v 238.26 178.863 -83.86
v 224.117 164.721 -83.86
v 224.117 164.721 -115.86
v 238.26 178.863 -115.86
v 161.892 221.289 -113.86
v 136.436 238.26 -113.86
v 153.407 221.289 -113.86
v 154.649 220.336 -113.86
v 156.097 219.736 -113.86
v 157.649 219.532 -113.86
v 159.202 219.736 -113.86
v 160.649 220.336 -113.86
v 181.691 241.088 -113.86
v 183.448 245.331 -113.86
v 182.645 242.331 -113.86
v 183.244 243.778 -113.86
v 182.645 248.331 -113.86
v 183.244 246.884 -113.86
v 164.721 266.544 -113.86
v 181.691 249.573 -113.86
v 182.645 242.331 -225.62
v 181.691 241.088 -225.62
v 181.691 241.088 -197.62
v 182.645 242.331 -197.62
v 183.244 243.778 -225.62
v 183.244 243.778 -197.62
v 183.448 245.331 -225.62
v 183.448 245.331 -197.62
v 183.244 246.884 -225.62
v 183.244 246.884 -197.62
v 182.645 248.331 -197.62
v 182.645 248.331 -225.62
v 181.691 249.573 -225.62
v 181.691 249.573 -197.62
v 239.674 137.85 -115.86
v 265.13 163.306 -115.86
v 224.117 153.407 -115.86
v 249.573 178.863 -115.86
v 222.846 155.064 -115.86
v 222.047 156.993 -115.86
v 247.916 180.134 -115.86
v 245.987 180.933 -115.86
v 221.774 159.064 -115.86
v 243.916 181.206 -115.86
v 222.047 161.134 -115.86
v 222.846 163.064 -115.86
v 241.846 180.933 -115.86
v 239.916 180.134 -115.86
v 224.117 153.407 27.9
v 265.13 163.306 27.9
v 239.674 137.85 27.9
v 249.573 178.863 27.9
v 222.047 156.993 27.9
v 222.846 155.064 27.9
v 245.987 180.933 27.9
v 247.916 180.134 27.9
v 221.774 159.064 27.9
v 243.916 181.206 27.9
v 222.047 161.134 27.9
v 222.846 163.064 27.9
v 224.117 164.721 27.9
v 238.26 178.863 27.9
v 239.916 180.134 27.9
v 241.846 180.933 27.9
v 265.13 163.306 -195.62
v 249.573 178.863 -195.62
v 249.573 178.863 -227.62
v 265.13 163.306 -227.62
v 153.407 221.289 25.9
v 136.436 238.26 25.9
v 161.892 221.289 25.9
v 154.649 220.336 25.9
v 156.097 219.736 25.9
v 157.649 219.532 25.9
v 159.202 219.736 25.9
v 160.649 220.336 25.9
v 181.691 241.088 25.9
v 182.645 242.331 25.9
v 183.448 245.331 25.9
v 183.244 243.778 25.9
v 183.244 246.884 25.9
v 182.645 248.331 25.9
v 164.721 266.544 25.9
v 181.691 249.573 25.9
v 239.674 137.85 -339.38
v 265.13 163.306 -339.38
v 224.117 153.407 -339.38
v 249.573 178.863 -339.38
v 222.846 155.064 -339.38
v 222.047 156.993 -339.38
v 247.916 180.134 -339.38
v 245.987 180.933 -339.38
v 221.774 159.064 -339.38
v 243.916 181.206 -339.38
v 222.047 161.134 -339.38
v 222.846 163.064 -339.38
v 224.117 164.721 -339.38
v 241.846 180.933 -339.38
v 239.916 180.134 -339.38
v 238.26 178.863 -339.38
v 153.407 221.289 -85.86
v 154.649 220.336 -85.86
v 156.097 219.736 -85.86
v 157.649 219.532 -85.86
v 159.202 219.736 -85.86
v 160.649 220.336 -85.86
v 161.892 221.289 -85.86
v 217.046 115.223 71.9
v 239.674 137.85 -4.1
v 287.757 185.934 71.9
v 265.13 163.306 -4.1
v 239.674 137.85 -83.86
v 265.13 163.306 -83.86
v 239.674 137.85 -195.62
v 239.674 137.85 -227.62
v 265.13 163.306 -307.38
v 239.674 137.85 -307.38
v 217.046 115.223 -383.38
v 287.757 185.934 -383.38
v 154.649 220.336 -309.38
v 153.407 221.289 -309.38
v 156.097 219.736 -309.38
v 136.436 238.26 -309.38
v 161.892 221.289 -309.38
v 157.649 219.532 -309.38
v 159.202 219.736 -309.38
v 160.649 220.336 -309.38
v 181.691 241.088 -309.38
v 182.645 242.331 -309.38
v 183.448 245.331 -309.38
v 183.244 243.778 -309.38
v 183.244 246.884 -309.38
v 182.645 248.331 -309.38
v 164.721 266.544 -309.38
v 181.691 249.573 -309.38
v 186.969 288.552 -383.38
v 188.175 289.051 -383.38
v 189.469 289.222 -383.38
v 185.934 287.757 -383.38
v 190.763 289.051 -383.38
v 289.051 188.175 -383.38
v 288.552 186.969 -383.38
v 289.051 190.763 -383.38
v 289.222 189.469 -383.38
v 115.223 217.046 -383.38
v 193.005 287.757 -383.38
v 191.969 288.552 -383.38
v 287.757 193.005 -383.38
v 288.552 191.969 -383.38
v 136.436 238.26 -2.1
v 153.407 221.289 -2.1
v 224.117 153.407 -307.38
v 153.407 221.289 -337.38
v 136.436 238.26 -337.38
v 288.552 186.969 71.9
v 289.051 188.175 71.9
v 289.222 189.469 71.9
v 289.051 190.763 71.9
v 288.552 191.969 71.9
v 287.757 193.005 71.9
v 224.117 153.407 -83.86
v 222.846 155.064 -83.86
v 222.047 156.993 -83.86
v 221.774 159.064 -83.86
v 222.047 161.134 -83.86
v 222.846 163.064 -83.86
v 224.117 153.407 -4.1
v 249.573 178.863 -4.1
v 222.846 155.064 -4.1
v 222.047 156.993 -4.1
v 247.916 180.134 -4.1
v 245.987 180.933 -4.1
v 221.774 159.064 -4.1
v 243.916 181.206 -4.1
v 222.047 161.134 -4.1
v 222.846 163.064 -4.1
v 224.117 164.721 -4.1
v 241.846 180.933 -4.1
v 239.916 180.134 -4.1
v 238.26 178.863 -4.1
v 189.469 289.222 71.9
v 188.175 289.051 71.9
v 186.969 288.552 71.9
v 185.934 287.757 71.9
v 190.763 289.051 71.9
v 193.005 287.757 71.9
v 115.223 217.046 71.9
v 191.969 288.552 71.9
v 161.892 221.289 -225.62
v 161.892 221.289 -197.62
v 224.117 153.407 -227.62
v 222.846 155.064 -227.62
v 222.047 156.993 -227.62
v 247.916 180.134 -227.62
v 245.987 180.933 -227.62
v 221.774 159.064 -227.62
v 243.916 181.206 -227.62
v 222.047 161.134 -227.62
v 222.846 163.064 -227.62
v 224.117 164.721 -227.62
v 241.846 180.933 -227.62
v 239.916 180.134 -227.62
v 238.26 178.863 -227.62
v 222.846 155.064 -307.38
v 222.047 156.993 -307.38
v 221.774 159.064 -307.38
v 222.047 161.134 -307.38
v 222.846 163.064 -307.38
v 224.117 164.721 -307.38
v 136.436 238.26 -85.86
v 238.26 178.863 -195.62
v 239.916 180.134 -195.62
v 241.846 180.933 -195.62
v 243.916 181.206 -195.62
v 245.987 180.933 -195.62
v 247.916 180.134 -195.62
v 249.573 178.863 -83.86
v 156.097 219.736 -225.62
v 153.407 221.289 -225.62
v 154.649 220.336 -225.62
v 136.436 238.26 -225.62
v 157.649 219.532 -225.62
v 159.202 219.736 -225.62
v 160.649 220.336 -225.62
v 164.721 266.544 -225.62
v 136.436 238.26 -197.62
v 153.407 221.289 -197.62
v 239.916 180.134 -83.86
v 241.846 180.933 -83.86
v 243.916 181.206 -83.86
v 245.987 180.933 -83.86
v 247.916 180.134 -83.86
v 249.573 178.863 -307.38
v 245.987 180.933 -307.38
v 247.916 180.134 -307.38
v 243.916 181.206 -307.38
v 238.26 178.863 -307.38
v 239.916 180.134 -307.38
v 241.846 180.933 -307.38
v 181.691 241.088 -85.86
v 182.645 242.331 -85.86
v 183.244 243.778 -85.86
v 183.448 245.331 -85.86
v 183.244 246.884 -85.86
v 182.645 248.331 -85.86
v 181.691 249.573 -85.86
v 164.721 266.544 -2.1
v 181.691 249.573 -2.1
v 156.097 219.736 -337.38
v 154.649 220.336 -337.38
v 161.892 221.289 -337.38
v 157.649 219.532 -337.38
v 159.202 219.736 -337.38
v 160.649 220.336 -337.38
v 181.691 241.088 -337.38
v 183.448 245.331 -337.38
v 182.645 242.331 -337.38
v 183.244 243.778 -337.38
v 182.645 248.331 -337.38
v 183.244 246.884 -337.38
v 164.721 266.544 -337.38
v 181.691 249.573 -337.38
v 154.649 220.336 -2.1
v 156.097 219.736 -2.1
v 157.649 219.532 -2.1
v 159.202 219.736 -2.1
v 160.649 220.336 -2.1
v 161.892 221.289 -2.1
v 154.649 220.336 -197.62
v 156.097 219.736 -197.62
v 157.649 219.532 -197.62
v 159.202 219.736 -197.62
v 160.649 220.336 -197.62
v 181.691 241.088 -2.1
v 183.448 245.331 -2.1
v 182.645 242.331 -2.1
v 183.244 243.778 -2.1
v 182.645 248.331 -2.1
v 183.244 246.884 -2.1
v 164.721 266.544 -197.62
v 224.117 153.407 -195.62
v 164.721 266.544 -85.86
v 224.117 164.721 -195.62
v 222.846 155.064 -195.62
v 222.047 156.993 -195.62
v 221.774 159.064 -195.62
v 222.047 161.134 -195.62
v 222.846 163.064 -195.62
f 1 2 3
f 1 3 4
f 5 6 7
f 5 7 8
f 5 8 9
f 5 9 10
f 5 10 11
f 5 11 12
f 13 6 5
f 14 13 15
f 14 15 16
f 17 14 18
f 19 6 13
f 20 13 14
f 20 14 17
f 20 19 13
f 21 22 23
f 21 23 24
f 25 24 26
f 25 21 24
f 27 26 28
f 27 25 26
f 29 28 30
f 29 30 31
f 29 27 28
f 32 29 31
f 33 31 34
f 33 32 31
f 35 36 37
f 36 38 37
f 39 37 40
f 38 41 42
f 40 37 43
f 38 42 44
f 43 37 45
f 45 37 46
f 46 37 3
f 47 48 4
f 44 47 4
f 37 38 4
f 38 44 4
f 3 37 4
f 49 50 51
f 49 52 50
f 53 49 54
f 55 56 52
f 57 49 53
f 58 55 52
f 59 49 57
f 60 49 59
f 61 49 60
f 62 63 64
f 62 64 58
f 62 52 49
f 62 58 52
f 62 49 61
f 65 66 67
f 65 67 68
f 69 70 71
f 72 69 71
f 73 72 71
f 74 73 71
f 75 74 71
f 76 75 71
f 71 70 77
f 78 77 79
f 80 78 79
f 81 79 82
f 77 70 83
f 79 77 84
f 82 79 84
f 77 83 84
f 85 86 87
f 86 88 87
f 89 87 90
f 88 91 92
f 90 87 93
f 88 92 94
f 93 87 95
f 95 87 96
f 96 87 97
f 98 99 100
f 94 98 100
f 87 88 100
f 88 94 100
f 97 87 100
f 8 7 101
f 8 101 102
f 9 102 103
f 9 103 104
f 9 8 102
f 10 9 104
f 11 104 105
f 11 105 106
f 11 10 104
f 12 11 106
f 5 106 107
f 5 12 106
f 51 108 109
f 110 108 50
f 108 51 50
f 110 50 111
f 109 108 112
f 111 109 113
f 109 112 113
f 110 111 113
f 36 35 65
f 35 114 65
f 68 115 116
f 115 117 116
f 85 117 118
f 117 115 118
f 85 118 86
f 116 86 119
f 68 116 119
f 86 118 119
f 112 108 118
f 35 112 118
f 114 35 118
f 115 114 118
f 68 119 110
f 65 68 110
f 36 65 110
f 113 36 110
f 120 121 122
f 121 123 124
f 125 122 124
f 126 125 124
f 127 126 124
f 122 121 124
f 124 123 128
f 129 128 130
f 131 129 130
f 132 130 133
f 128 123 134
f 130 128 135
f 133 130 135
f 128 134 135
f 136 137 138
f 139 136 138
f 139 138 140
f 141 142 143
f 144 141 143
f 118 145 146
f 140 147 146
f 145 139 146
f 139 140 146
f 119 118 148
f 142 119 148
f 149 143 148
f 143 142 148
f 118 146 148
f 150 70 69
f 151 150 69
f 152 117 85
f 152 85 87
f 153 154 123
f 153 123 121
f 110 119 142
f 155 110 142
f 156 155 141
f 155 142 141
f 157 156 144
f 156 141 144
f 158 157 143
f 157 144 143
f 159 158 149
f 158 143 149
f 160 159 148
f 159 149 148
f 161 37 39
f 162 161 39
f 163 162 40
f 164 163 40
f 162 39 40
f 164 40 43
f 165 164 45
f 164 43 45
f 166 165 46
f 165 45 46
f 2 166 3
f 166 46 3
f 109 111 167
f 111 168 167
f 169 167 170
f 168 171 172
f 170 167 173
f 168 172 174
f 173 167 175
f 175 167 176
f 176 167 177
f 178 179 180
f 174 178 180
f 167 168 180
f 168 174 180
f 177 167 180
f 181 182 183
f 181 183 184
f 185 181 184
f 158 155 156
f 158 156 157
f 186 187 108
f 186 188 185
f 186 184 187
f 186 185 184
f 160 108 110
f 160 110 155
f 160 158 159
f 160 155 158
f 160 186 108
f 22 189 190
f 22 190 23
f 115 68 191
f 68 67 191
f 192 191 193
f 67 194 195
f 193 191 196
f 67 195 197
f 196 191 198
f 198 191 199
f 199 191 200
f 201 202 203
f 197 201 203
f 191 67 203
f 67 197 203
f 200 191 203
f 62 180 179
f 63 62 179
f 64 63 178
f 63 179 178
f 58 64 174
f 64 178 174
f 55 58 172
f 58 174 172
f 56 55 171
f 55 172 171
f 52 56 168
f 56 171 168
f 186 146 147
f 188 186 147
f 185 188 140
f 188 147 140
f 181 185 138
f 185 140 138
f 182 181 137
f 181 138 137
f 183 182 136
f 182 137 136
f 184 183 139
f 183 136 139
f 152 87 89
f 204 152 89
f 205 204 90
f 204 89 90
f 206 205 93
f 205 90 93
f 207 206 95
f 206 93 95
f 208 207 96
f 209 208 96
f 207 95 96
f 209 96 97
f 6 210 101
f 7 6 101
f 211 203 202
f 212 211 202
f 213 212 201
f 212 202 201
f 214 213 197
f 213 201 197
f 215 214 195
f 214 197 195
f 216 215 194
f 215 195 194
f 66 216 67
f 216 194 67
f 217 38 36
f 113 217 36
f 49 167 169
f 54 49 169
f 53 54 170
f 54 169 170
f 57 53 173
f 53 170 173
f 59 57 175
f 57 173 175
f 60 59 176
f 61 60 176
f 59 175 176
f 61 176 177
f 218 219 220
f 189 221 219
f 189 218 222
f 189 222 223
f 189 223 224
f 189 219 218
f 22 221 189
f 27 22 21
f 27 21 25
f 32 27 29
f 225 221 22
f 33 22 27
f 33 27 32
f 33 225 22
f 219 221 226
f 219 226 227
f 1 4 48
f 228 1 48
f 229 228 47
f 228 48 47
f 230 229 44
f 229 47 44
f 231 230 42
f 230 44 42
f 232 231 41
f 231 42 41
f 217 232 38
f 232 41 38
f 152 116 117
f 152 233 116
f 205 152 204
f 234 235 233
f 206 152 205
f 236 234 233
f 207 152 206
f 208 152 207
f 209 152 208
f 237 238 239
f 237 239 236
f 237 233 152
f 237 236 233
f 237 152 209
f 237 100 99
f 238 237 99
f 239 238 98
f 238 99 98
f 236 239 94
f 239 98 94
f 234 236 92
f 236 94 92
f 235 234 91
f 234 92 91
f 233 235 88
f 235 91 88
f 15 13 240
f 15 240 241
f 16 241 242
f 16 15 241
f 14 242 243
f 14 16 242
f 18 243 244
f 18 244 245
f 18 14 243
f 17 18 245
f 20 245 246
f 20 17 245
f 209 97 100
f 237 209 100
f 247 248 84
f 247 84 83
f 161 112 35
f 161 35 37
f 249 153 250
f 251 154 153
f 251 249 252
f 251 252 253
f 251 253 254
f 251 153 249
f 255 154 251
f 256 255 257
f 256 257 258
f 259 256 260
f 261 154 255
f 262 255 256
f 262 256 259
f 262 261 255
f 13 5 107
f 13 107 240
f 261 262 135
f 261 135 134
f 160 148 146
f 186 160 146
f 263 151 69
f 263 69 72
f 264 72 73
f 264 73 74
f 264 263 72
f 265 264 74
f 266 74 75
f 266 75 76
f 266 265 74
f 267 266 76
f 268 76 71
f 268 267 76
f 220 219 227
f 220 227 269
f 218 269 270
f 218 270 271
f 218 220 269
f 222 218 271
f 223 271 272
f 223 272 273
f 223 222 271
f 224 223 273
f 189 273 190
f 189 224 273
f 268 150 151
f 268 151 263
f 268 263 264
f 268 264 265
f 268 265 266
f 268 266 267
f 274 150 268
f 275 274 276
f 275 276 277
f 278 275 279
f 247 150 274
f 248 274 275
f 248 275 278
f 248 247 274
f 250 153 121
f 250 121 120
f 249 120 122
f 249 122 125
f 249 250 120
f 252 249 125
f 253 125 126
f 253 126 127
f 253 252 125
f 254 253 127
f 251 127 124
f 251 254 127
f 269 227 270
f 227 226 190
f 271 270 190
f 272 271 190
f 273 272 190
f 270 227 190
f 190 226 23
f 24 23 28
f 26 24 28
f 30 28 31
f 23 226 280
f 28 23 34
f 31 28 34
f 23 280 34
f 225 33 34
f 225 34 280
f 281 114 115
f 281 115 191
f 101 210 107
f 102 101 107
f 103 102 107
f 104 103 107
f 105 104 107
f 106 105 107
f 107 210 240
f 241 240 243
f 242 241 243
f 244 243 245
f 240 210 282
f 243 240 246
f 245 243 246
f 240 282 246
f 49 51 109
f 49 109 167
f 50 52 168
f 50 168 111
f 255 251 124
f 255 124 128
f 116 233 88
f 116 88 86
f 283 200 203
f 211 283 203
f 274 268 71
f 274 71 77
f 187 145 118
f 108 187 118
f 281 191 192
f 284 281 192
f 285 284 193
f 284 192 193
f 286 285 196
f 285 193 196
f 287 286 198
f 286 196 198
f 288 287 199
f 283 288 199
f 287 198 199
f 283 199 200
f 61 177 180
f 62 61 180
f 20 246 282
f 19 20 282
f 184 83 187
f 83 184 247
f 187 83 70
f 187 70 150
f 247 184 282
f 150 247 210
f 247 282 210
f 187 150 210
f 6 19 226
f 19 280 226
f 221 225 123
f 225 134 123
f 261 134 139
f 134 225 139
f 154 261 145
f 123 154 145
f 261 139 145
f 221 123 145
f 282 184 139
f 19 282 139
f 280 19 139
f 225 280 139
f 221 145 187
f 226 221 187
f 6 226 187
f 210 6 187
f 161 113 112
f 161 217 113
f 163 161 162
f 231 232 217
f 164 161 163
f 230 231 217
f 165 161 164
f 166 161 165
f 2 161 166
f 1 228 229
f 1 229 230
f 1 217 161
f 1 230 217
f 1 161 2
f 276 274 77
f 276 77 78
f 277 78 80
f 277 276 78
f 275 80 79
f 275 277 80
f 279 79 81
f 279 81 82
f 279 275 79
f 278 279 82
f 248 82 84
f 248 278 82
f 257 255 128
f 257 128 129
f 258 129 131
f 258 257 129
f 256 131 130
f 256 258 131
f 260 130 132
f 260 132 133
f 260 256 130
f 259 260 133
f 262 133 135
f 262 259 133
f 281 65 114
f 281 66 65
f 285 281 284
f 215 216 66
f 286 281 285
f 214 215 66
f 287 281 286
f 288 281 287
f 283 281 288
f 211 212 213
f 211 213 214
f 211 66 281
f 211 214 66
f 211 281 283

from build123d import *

# Parameters (mm, degrees)
HEAD_START           = -383.38
HEAD_CASTING_DEPTH   = 455.28
INTAKE_START         = -2.1
INTAKE_PORT_1_DEPTH  = 28
EXHAUST_START        = -4.1
EXHAUST_PORT_1_DEPTH = 32
INTAKE_START_2       = -113.86
INTAKE_PORT_3_DEPTH  = 28
EXHAUST_START_2      = -115.86
EXHAUST_PORT_3_DEPTH = 32
INTAKE_START_3       = -225.62
INTAKE_PORT_5_DEPTH  = 28
EXHAUST_START_3      = -227.62
EXHAUST_PORT_5_DEPTH = 32
INTAKE_START_4       = -337.38
INTAKE_PORT_7_DEPTH  = 28
EXHAUST_START_4      = -339.38
EXHAUST_PORT_7_DEPTH = 32


with BuildPart() as part:
    # Sketch1 → Head Casting (new body)
    with BuildSketch(Plane.XY.offset(HEAD_START)):
        with BuildLine():
            Line((115.223049994, 217.046426485), (217.046426485, 115.223049994))
            Line((217.046426485, 115.223049994), (287.757104604, 185.933728113))
            ThreePointArc((287.757104604, 185.933728113), (289.221570698, 189.469262019), (287.757104604, 193.004795925))
            Line((287.757104604, 193.004795925), (193.004795925, 287.757104604))
            ThreePointArc((193.004795925, 287.757104604), (189.469262019, 289.221570698), (185.933728113, 287.757104604))
            Line((185.933728113, 287.757104604), (115.223049994, 217.046426485))
        make_face()
    extrude(amount=HEAD_CASTING_DEPTH)

    # Sketch2 → Intake Port 1 (cut)
    with BuildSketch(Plane.XY.offset(INTAKE_START)):
        with BuildLine():
            Line((135.729146649, 238.966736702), (153.406816178, 221.289067172))
            ThreePointArc((153.406816178, 221.289067172), (157.649456866, 219.531707859), (161.892097553, 221.289067172))
            Line((161.892097553, 221.289067172), (181.691087426, 241.088057046))
            ThreePointArc((181.691087426, 241.088057046), (183.448446739, 245.330697733), (181.691087426, 249.57333842))
            Line((181.691087426, 249.57333842), (164.013417896, 267.251007949))
            Line((164.013417896, 267.251007949), (135.729146649, 238.966736702))
        make_face()
    extrude(amount=INTAKE_PORT_1_DEPTH, mode=Mode.SUBTRACT)

    # Sketch3 → Exhaust Port 1 (cut)
    with BuildSketch(Plane.XY.offset(EXHAUST_START)):
        with BuildLine():
            Line((240.380950264, 137.143360211), (224.117494297, 153.406816178))
            ThreePointArc((224.117494297, 153.406816178), (221.774348547, 159.063670428), (224.117494297, 164.720524677))
            Line((224.117494297, 164.720524677), (238.259629921, 178.862660301))
            ThreePointArc((238.259629921, 178.862660301), (243.91648417, 181.205806052), (249.57333842, 178.862660301))
            Line((249.57333842, 178.862660301), (265.836794387, 162.599204334))
            Line((265.836794387, 162.599204334), (240.380950264, 137.143360211))
        make_face()
    extrude(amount=EXHAUST_PORT_1_DEPTH, mode=Mode.SUBTRACT)

    # Sketch4 → Intake Port 3 (cut)
    with BuildSketch(Plane.XY.offset(INTAKE_START_2)):
        with BuildLine():
            Line((135.729146649, 238.966736702), (153.406816178, 221.289067172))
            ThreePointArc((153.406816178, 221.289067172), (157.649456866, 219.531707859), (161.892097553, 221.289067172))
            Line((161.892097553, 221.289067172), (181.691087426, 241.088057046))
            ThreePointArc((181.691087426, 241.088057046), (183.448446739, 245.330697733), (181.691087426, 249.57333842))
            Line((181.691087426, 249.57333842), (164.013417896, 267.251007949))
            Line((164.013417896, 267.251007949), (135.729146649, 238.966736702))
        make_face()
    extrude(amount=INTAKE_PORT_3_DEPTH, mode=Mode.SUBTRACT)

    # Sketch5 → Exhaust Port 3 (cut)
    with BuildSketch(Plane.XY.offset(EXHAUST_START_2)):
        with BuildLine():
            Line((240.380950264, 137.143360211), (224.117494297, 153.406816178))
            ThreePointArc((224.117494297, 153.406816178), (221.774348547, 159.063670428), (224.117494297, 164.720524677))
            Line((224.117494297, 164.720524677), (238.259629921, 178.862660301))
            ThreePointArc((238.259629921, 178.862660301), (243.91648417, 181.205806052), (249.57333842, 178.862660301))
            Line((249.57333842, 178.862660301), (265.836794387, 162.599204334))
            Line((265.836794387, 162.599204334), (240.380950264, 137.143360211))
        make_face()
    extrude(amount=EXHAUST_PORT_3_DEPTH, mode=Mode.SUBTRACT)

    # Sketch6 → Intake Port 5 (cut)
    with BuildSketch(Plane.XY.offset(INTAKE_START_3)):
        with BuildLine():
            Line((135.729146649, 238.966736702), (153.406816178, 221.289067172))
            ThreePointArc((153.406816178, 221.289067172), (157.649456866, 219.531707859), (161.892097553, 221.289067172))
            Line((161.892097553, 221.289067172), (181.691087426, 241.088057046))
            ThreePointArc((181.691087426, 241.088057046), (183.448446739, 245.330697733), (181.691087426, 249.57333842))
            Line((181.691087426, 249.57333842), (164.013417896, 267.251007949))
            Line((164.013417896, 267.251007949), (135.729146649, 238.966736702))
        make_face()
    extrude(amount=INTAKE_PORT_5_DEPTH, mode=Mode.SUBTRACT)

    # Sketch7 → Exhaust Port 5 (cut)
    with BuildSketch(Plane.XY.offset(EXHAUST_START_3)):
        with BuildLine():
            Line((240.380950264, 137.143360211), (224.117494297, 153.406816178))
            ThreePointArc((224.117494297, 153.406816178), (221.774348547, 159.063670428), (224.117494297, 164.720524677))
            Line((224.117494297, 164.720524677), (238.259629921, 178.862660301))
            ThreePointArc((238.259629921, 178.862660301), (243.91648417, 181.205806052), (249.57333842, 178.862660301))
            Line((249.57333842, 178.862660301), (265.836794387, 162.599204334))
            Line((265.836794387, 162.599204334), (240.380950264, 137.143360211))
        make_face()
    extrude(amount=EXHAUST_PORT_5_DEPTH, mode=Mode.SUBTRACT)

    # Sketch8 → Intake Port 7 (cut)
    with BuildSketch(Plane.XY.offset(INTAKE_START_4)):
        with BuildLine():
            Line((135.729146649, 238.966736702), (153.406816178, 221.289067172))
            ThreePointArc((153.406816178, 221.289067172), (157.649456866, 219.531707859), (161.892097553, 221.289067172))
            Line((161.892097553, 221.289067172), (181.691087426, 241.088057046))
            ThreePointArc((181.691087426, 241.088057046), (183.448446739, 245.330697733), (181.691087426, 249.57333842))
            Line((181.691087426, 249.57333842), (164.013417896, 267.251007949))
            Line((164.013417896, 267.251007949), (135.729146649, 238.966736702))
        make_face()
    extrude(amount=INTAKE_PORT_7_DEPTH, mode=Mode.SUBTRACT)

    # Sketch9 → Exhaust Port 7 (cut)
    with BuildSketch(Plane.XY.offset(EXHAUST_START_4)):
        with BuildLine():
            Line((240.380950264, 137.143360211), (224.117494297, 153.406816178))
            ThreePointArc((224.117494297, 153.406816178), (221.774348547, 159.063670428), (224.117494297, 164.720524677))
            Line((224.117494297, 164.720524677), (238.259629921, 178.862660301))
            ThreePointArc((238.259629921, 178.862660301), (243.91648417, 181.205806052), (249.57333842, 178.862660301))
            Line((249.57333842, 178.862660301), (265.836794387, 162.599204334))
            Line((265.836794387, 162.599204334), (240.380950264, 137.143360211))
        make_face()
    extrude(amount=EXHAUST_PORT_7_DEPTH, mode=Mode.SUBTRACT)


solid = part.part
